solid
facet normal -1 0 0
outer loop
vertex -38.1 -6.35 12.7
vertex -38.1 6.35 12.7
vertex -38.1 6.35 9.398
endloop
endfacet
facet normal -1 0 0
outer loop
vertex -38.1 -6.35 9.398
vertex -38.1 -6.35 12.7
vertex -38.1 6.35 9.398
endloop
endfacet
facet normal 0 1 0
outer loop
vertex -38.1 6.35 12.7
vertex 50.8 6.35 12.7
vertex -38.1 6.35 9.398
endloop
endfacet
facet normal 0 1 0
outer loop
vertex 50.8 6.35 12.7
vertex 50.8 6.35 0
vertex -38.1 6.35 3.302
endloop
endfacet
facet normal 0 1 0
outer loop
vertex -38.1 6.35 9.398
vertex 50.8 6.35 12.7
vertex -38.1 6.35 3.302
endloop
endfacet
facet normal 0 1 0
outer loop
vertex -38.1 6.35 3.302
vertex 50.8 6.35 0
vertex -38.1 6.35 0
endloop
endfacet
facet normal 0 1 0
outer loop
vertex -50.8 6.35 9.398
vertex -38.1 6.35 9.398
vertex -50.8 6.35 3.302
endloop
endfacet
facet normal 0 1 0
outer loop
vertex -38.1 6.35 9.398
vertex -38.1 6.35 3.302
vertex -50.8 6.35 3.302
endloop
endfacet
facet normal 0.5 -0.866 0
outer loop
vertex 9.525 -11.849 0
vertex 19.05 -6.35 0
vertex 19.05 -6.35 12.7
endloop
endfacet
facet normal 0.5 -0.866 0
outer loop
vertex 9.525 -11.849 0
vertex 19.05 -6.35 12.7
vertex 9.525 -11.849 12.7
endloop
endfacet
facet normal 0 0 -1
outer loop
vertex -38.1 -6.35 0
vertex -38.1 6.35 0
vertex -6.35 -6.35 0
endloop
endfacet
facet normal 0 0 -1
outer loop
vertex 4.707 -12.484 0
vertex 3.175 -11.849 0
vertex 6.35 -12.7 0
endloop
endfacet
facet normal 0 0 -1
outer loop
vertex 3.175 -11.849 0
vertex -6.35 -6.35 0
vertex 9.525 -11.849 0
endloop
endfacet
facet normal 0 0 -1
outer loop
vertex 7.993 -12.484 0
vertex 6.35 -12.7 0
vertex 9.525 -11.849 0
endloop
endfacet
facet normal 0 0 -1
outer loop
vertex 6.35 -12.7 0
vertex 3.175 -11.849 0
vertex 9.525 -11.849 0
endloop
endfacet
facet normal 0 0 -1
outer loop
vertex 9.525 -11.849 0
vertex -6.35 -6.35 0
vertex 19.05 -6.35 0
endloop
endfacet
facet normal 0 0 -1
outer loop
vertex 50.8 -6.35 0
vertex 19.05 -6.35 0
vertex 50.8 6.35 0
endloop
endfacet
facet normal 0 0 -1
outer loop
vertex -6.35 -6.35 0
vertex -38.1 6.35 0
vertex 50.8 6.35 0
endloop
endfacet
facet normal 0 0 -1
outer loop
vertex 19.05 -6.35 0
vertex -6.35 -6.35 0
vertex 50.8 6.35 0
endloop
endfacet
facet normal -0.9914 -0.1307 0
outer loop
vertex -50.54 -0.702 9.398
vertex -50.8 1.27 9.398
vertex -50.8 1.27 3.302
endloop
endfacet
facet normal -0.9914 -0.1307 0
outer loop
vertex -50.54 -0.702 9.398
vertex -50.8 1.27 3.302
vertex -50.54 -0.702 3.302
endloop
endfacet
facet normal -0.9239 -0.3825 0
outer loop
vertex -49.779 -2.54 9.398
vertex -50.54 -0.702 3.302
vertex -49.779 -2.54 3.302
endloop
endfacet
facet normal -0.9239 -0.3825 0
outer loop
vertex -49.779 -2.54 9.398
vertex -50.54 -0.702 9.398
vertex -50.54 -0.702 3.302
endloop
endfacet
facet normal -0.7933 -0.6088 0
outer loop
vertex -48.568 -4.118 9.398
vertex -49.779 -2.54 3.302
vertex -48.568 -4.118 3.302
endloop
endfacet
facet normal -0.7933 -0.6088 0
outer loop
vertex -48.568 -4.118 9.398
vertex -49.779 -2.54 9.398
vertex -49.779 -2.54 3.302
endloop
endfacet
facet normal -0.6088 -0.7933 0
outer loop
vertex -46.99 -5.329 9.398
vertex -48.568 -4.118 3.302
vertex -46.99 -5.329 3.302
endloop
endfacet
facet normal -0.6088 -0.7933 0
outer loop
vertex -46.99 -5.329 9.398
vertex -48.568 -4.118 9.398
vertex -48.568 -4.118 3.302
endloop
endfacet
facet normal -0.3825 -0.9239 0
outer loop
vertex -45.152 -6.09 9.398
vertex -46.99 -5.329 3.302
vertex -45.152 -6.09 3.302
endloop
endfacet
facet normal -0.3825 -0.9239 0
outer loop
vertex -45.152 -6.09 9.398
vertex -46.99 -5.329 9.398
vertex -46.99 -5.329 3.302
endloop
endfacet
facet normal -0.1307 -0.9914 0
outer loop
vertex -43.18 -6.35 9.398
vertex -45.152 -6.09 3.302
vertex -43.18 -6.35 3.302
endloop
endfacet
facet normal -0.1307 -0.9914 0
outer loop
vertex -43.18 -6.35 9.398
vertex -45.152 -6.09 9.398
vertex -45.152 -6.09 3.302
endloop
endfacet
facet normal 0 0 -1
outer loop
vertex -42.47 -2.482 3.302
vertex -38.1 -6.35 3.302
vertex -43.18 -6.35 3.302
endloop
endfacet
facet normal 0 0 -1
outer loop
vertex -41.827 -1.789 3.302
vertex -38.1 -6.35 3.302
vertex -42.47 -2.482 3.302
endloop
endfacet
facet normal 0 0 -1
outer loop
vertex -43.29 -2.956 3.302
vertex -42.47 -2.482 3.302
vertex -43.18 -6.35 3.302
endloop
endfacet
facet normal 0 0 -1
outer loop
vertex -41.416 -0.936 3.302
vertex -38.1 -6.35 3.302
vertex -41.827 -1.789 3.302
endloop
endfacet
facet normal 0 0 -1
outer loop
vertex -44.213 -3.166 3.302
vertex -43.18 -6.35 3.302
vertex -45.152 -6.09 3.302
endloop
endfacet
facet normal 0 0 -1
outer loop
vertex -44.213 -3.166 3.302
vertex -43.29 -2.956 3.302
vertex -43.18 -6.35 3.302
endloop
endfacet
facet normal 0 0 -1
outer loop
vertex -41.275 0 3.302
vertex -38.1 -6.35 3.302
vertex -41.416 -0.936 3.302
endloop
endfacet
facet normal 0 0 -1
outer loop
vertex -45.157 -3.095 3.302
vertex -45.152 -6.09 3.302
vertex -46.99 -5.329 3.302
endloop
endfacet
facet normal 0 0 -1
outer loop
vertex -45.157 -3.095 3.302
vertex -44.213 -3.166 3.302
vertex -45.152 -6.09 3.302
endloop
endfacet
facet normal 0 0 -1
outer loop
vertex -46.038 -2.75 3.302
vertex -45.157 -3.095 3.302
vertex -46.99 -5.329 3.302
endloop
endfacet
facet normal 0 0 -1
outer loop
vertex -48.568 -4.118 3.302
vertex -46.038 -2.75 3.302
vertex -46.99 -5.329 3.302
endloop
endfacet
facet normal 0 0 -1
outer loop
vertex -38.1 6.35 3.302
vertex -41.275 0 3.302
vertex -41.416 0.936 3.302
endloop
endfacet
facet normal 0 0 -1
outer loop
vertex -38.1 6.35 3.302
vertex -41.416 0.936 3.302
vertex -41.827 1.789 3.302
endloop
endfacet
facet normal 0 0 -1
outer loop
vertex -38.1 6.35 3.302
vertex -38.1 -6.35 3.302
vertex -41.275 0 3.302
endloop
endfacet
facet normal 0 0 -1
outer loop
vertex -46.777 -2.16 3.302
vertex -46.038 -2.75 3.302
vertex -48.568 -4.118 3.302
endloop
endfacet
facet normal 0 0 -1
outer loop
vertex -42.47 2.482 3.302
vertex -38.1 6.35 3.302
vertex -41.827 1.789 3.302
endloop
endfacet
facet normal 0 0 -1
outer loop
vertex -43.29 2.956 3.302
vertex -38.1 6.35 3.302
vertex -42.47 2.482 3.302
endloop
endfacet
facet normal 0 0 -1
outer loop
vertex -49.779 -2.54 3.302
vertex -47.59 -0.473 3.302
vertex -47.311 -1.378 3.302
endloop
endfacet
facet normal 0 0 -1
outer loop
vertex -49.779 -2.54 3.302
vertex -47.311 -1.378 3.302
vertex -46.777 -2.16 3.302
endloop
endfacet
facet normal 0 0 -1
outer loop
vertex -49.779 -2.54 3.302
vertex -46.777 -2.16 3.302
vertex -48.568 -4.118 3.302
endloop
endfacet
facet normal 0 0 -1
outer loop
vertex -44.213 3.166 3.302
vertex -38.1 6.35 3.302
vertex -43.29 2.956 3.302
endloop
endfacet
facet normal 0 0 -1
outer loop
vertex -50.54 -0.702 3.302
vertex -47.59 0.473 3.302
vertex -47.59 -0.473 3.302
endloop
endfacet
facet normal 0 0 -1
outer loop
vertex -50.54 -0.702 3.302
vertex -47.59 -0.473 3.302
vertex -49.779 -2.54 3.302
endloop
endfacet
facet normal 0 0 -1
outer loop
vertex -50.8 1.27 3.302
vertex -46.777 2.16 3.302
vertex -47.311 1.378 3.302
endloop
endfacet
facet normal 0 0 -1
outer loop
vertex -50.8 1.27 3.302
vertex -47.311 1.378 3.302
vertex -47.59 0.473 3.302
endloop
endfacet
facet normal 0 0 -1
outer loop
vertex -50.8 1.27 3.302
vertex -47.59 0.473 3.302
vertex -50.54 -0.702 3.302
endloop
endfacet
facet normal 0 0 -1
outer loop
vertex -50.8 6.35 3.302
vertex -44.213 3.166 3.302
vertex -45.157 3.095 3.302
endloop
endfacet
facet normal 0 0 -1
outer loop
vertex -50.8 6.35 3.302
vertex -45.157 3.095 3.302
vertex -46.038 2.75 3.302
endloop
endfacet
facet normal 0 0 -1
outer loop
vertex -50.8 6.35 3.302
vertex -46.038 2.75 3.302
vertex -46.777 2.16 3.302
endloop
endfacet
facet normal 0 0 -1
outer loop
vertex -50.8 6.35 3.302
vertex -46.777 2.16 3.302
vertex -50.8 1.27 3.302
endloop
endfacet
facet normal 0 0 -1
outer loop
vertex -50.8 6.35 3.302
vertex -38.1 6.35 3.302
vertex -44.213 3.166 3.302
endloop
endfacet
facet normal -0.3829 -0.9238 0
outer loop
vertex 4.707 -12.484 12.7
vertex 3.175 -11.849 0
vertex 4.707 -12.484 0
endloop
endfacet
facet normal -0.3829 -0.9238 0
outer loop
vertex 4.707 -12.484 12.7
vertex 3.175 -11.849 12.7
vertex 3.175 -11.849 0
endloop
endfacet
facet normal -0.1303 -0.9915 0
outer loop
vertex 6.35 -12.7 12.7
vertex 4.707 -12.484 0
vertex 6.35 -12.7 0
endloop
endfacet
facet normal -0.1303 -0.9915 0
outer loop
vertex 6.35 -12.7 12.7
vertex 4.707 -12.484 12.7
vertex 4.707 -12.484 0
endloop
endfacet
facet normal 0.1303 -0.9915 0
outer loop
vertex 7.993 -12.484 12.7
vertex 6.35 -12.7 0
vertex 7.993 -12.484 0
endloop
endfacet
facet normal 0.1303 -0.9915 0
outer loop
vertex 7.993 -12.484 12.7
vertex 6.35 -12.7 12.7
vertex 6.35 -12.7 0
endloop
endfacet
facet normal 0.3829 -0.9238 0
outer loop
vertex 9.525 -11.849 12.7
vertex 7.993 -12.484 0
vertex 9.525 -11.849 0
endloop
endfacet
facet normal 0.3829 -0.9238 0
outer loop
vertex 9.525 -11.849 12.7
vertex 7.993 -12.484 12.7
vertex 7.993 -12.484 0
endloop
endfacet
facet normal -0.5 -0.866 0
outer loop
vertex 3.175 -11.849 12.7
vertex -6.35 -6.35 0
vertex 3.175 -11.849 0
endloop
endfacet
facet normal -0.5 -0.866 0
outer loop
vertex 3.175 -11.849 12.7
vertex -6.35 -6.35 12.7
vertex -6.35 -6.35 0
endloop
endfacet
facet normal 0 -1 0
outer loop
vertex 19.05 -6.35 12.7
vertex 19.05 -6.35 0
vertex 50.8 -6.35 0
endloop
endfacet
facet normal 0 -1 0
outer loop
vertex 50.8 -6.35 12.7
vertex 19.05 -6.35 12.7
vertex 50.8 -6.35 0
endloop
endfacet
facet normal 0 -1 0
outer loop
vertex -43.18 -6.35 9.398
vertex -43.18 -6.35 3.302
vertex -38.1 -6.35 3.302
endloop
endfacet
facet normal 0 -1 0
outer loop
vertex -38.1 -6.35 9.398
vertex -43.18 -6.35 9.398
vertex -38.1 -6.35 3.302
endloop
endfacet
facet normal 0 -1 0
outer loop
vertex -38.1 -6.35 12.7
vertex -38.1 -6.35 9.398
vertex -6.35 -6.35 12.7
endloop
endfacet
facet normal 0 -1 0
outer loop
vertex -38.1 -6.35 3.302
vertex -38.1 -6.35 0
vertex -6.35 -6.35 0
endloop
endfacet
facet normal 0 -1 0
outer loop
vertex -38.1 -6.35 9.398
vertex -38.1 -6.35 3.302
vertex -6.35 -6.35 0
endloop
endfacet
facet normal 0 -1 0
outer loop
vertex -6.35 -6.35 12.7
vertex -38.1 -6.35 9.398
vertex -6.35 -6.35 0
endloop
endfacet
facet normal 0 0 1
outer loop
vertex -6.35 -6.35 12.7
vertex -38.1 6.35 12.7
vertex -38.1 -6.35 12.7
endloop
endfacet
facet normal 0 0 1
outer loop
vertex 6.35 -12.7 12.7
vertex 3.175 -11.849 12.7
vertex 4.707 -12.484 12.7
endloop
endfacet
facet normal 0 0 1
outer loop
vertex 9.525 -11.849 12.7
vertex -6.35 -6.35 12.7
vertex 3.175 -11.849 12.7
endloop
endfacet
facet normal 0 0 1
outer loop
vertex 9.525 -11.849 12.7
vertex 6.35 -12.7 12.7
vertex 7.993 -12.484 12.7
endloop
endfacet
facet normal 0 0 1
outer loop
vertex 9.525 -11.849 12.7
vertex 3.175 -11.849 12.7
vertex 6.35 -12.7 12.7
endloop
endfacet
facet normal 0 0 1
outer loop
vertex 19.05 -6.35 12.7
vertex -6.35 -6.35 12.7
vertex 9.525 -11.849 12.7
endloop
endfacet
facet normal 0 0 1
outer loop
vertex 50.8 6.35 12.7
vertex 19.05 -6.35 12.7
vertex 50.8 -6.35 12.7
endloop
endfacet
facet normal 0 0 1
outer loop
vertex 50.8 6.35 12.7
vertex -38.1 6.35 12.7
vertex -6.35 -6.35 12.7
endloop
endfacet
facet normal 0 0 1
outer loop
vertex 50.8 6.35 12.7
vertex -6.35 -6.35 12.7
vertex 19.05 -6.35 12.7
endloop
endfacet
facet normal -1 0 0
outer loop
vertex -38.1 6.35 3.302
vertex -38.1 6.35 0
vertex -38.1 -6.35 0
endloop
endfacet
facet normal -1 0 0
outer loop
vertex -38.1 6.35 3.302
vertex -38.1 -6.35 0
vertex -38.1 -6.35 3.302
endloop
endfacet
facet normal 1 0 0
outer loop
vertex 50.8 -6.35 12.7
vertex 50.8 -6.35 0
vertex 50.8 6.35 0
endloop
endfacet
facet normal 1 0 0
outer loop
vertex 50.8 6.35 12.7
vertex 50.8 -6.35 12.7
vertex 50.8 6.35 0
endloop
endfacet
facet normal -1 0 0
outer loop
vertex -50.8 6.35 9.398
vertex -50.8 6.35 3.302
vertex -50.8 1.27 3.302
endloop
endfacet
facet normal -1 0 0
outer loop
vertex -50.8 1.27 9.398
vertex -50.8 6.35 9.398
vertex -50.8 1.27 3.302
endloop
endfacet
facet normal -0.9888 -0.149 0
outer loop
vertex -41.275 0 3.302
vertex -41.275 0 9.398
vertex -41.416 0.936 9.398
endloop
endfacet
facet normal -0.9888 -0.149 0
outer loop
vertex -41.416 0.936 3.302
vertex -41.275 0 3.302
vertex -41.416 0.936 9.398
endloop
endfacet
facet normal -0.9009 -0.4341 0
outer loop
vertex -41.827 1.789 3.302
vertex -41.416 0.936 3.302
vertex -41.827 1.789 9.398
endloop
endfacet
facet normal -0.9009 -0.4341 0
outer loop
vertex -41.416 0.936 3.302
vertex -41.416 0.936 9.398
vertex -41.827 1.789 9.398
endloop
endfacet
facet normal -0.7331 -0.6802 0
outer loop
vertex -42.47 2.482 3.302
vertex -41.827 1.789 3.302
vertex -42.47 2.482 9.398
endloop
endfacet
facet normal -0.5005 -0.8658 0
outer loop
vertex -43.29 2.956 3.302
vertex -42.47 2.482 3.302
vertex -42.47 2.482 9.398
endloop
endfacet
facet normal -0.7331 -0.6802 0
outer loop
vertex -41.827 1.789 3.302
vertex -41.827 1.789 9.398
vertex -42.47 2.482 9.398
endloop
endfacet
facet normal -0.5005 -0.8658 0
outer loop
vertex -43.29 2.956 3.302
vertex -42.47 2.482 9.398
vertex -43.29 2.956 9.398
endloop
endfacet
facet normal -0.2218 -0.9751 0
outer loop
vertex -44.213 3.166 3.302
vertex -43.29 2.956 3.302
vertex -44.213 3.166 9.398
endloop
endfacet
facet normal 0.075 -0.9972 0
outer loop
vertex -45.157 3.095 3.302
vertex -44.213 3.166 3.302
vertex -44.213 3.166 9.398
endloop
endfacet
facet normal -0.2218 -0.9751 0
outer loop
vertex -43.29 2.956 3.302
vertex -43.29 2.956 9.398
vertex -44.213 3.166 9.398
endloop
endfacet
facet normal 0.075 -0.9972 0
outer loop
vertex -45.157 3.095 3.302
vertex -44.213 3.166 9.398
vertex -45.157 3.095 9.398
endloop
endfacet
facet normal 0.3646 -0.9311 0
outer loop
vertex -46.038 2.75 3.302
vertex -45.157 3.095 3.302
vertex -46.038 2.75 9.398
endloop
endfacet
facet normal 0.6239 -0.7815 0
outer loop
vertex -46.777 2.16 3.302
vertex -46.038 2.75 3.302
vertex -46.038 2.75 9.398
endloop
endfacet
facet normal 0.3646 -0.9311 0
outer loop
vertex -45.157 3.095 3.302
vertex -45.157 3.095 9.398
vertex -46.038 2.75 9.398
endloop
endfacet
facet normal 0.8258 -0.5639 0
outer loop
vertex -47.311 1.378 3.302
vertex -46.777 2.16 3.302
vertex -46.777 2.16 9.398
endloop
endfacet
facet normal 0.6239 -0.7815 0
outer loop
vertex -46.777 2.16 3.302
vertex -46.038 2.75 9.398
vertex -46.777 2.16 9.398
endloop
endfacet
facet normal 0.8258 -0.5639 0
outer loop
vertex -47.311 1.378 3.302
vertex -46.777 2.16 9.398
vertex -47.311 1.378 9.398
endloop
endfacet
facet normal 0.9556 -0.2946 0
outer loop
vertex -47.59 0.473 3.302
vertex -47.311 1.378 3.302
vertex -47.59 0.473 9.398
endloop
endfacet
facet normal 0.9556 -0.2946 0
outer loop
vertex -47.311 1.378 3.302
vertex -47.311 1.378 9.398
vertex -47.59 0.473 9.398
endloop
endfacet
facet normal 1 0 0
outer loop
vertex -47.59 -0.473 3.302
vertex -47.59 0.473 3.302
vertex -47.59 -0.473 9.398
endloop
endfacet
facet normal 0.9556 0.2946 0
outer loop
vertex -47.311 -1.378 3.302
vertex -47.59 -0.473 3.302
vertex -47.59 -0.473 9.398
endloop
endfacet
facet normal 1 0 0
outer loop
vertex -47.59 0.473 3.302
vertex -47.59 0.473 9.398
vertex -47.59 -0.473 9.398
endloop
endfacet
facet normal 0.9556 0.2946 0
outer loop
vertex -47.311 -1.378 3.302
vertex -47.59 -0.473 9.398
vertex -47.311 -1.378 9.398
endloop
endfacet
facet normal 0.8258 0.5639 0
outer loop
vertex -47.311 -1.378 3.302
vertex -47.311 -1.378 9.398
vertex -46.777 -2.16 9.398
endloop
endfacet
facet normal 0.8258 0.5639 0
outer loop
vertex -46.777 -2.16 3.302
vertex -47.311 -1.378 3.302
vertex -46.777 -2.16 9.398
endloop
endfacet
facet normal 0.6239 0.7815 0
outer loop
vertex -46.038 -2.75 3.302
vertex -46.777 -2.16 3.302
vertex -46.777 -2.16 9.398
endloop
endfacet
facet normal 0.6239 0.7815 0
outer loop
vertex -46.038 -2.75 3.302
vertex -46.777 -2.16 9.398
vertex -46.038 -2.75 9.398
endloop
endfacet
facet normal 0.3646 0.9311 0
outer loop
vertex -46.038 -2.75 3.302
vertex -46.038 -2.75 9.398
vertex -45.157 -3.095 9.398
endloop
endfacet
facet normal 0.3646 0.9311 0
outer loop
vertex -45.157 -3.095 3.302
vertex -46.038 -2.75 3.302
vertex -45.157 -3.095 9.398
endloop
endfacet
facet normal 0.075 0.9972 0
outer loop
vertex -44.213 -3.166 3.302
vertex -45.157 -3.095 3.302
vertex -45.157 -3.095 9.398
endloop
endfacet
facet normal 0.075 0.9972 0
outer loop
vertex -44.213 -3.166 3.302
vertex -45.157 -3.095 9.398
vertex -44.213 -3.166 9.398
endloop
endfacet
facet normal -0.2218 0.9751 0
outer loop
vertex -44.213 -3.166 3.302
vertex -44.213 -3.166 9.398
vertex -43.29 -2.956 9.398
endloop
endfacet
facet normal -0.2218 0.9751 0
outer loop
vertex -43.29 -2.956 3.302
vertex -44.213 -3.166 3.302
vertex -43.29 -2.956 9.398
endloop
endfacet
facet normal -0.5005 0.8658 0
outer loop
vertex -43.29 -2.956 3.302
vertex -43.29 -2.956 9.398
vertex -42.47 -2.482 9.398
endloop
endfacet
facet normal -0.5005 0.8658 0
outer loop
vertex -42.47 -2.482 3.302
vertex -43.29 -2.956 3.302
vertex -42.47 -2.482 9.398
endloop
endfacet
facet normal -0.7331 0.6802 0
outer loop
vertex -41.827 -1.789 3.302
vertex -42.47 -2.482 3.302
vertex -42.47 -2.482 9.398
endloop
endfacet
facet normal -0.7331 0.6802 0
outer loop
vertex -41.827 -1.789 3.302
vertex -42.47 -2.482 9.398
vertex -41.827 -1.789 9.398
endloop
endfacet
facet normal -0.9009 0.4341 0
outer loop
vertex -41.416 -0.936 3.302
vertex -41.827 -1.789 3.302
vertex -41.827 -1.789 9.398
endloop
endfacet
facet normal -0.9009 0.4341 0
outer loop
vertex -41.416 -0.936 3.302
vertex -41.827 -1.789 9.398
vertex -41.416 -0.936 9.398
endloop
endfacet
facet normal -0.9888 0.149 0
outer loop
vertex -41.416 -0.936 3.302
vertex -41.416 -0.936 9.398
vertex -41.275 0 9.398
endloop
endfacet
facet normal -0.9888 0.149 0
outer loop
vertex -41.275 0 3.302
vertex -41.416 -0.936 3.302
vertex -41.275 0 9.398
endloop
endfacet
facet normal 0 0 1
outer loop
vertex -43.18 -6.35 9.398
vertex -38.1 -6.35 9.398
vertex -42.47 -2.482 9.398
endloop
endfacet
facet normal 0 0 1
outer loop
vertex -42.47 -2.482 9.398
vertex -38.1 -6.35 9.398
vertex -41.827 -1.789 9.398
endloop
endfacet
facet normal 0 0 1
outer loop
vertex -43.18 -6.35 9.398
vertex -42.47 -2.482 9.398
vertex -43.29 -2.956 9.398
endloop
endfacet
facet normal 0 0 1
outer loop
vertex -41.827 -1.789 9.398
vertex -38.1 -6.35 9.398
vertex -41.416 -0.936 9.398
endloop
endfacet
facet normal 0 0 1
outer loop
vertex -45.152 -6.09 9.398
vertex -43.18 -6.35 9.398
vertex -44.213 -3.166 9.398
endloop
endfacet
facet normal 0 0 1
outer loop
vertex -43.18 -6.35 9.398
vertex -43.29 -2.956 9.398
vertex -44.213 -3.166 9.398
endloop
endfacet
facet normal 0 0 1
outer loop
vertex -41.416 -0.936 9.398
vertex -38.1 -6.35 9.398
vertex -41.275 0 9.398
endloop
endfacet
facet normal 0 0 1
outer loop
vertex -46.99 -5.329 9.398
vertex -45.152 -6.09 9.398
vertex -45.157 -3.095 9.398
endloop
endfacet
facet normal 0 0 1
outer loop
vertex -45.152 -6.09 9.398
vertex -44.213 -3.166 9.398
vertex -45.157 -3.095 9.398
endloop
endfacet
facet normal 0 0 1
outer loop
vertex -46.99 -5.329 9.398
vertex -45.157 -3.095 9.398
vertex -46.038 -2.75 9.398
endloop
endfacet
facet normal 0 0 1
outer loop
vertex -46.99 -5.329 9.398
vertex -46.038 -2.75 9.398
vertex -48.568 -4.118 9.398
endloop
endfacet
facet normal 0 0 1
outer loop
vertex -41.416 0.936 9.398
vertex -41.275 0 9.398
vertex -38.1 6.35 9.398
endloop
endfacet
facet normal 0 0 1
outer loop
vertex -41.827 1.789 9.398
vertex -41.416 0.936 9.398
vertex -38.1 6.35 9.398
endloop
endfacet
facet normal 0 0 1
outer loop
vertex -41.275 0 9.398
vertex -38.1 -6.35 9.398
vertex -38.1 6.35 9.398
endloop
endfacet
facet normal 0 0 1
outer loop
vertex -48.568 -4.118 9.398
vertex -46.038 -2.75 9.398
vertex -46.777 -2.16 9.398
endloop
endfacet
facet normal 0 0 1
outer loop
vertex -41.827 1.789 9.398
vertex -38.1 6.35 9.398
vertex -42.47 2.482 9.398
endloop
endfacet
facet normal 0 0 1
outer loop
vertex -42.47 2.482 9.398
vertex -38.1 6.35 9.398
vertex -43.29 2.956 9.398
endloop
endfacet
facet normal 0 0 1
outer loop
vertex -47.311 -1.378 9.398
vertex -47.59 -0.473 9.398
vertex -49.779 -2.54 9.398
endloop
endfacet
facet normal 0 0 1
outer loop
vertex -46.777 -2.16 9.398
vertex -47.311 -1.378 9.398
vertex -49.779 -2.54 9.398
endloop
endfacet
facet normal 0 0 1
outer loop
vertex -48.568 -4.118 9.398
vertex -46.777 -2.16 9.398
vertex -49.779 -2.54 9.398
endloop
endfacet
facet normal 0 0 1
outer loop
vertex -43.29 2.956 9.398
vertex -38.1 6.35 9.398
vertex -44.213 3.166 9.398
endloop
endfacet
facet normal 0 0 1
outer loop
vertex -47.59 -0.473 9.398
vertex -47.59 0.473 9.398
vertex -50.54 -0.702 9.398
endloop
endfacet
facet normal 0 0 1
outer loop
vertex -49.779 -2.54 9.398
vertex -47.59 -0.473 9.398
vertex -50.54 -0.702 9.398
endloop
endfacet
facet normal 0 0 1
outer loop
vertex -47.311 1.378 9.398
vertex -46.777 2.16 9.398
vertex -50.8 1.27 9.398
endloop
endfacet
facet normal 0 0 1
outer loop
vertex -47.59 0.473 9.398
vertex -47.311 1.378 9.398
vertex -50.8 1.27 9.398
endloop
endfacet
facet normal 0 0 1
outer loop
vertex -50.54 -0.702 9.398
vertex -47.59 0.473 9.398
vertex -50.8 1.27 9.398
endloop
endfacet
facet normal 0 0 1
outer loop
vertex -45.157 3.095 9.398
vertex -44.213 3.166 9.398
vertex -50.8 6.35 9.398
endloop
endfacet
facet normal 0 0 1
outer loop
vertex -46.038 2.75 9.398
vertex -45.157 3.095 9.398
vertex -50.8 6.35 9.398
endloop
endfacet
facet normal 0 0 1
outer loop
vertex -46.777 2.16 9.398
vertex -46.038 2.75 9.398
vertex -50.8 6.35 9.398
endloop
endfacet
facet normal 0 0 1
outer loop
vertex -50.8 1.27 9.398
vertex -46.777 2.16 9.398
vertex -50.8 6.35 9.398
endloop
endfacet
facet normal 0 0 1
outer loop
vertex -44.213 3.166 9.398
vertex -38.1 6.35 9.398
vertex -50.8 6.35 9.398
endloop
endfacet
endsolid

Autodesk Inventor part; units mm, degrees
ref_plane "YZ Plane" through (0, 0, 0) normal (1, 0, 0) x (0, 1, 0)
ref_plane "XZ Plane" through (0, 0, 0) normal (0, 1, 0) x (-1, 0, 0)
ref_plane "XY Plane" through (0, 0, 0) normal (0, 0, 1) x (1, 0, 0)
sketch "Sketch1" plane through (0, 0, 0) normal (0, 0, 1) x (1, 0, 0)
  line L0 (-50.8, -6.35) -> (50.8, -6.35)
  line L1 (50.8, -6.35) -> (50.8, 6.35)
  line L2 (50.8, 6.35) -> (-50.8, 6.35)
  line L3 (-50.8, 6.35) -> (-50.8, -6.35)
  line L4 (-50.8, -6.35) -> (50.8, 6.35) construction
  line L5 (50.8, -6.35) -> (-50.8, 6.35) construction
  point P0 (0, 0)
  dimension "d0" = 101.6
  dimension "d1" = 12.7
extrude "Extrusion1" add sketch "Sketch1" along normal blind 12.7
fillet "Fillet1" radius 7.62 1 edges at (-50.8, -6.35, 6.35)
sketch "Sketch2" plane through (0, 0, 12.7) normal (0, 0, 1) x (1, 0, 0)
  circle A0 centre (-44.45, 0) radius 3.175
  line L0 (-50.8, 6.35) -> (-50.8, 1.27) projected
  line L1 (50.8, 6.35) -> (-50.8, 6.35) projected
  point P0 (0, 0)
  dimension "d5" = 6.35
  dimension "d6" = 6.35
  dimension "d7" = 6.35
extrude "Extrusion2" cut sketch "Sketch2" against normal blind 12.7
sketch "Sketch3" plane through (0, 0, 12.7) normal (0, 0, 1) x (1, 0, 0)
  line L0 (-43.18, -6.35) -> (50.8, -6.35) projected
  circle A0 centre (6.35, -6.35) radius 6.35
  line L1 (-6.35, -6.35) -> (3.175, -11.8493)
  line L2 (19.05, -6.35) -> (9.525, -11.8493)
  line L3 (-50.8, 6.35) -> (-50.8, 1.27) projected
  point P0 (0, 0)
  dimension "d10" = 12.7
  dimension "d11" = 12.7
  dimension "d12" = 12.7
  dimension "d15" = 57.15
extrude "Extrusion3" add sketch "Sketch3" against normal blind 12.7 contours A0 L0 | L0 L2 A0 | A0 L1 L0 picked at (4.9799, -8.3631)
sketch "Sketch4" plane through (-50.8, 6.35, 0) normal (0, 1, 0) x (1, 0, 0)
  line L0 (7.62, -12.7) -> (0, -12.7) projected
  line L1 (0, -12.7) -> (12.7, -12.7)
  line L2 (12.7, -12.7) -> (12.7, -9.398)
  line L3 (12.7, -9.398) -> (0, -9.398)
  line L4 (0, -9.398) -> (0, -12.7)
  line L5 (0, 0) -> (12.7, 0)
  line L6 (12.7, 0) -> (12.7, -3.302)
  line L7 (12.7, -3.302) -> (0, -3.302)
  line L8 (0, -3.302) -> (0, 0)
  line L9 (101.6, 0) -> (0, 0) projected
  point P0 (50.8, 0)
  dimension "d16" = 12.7
  dimension "d17" = 3.302
  dimension "d21" = 3.302
extrude "Extrusion4" cut sketch "Sketch4" against normal blind 12.7
properties part number "Press_Upper_Arm"
